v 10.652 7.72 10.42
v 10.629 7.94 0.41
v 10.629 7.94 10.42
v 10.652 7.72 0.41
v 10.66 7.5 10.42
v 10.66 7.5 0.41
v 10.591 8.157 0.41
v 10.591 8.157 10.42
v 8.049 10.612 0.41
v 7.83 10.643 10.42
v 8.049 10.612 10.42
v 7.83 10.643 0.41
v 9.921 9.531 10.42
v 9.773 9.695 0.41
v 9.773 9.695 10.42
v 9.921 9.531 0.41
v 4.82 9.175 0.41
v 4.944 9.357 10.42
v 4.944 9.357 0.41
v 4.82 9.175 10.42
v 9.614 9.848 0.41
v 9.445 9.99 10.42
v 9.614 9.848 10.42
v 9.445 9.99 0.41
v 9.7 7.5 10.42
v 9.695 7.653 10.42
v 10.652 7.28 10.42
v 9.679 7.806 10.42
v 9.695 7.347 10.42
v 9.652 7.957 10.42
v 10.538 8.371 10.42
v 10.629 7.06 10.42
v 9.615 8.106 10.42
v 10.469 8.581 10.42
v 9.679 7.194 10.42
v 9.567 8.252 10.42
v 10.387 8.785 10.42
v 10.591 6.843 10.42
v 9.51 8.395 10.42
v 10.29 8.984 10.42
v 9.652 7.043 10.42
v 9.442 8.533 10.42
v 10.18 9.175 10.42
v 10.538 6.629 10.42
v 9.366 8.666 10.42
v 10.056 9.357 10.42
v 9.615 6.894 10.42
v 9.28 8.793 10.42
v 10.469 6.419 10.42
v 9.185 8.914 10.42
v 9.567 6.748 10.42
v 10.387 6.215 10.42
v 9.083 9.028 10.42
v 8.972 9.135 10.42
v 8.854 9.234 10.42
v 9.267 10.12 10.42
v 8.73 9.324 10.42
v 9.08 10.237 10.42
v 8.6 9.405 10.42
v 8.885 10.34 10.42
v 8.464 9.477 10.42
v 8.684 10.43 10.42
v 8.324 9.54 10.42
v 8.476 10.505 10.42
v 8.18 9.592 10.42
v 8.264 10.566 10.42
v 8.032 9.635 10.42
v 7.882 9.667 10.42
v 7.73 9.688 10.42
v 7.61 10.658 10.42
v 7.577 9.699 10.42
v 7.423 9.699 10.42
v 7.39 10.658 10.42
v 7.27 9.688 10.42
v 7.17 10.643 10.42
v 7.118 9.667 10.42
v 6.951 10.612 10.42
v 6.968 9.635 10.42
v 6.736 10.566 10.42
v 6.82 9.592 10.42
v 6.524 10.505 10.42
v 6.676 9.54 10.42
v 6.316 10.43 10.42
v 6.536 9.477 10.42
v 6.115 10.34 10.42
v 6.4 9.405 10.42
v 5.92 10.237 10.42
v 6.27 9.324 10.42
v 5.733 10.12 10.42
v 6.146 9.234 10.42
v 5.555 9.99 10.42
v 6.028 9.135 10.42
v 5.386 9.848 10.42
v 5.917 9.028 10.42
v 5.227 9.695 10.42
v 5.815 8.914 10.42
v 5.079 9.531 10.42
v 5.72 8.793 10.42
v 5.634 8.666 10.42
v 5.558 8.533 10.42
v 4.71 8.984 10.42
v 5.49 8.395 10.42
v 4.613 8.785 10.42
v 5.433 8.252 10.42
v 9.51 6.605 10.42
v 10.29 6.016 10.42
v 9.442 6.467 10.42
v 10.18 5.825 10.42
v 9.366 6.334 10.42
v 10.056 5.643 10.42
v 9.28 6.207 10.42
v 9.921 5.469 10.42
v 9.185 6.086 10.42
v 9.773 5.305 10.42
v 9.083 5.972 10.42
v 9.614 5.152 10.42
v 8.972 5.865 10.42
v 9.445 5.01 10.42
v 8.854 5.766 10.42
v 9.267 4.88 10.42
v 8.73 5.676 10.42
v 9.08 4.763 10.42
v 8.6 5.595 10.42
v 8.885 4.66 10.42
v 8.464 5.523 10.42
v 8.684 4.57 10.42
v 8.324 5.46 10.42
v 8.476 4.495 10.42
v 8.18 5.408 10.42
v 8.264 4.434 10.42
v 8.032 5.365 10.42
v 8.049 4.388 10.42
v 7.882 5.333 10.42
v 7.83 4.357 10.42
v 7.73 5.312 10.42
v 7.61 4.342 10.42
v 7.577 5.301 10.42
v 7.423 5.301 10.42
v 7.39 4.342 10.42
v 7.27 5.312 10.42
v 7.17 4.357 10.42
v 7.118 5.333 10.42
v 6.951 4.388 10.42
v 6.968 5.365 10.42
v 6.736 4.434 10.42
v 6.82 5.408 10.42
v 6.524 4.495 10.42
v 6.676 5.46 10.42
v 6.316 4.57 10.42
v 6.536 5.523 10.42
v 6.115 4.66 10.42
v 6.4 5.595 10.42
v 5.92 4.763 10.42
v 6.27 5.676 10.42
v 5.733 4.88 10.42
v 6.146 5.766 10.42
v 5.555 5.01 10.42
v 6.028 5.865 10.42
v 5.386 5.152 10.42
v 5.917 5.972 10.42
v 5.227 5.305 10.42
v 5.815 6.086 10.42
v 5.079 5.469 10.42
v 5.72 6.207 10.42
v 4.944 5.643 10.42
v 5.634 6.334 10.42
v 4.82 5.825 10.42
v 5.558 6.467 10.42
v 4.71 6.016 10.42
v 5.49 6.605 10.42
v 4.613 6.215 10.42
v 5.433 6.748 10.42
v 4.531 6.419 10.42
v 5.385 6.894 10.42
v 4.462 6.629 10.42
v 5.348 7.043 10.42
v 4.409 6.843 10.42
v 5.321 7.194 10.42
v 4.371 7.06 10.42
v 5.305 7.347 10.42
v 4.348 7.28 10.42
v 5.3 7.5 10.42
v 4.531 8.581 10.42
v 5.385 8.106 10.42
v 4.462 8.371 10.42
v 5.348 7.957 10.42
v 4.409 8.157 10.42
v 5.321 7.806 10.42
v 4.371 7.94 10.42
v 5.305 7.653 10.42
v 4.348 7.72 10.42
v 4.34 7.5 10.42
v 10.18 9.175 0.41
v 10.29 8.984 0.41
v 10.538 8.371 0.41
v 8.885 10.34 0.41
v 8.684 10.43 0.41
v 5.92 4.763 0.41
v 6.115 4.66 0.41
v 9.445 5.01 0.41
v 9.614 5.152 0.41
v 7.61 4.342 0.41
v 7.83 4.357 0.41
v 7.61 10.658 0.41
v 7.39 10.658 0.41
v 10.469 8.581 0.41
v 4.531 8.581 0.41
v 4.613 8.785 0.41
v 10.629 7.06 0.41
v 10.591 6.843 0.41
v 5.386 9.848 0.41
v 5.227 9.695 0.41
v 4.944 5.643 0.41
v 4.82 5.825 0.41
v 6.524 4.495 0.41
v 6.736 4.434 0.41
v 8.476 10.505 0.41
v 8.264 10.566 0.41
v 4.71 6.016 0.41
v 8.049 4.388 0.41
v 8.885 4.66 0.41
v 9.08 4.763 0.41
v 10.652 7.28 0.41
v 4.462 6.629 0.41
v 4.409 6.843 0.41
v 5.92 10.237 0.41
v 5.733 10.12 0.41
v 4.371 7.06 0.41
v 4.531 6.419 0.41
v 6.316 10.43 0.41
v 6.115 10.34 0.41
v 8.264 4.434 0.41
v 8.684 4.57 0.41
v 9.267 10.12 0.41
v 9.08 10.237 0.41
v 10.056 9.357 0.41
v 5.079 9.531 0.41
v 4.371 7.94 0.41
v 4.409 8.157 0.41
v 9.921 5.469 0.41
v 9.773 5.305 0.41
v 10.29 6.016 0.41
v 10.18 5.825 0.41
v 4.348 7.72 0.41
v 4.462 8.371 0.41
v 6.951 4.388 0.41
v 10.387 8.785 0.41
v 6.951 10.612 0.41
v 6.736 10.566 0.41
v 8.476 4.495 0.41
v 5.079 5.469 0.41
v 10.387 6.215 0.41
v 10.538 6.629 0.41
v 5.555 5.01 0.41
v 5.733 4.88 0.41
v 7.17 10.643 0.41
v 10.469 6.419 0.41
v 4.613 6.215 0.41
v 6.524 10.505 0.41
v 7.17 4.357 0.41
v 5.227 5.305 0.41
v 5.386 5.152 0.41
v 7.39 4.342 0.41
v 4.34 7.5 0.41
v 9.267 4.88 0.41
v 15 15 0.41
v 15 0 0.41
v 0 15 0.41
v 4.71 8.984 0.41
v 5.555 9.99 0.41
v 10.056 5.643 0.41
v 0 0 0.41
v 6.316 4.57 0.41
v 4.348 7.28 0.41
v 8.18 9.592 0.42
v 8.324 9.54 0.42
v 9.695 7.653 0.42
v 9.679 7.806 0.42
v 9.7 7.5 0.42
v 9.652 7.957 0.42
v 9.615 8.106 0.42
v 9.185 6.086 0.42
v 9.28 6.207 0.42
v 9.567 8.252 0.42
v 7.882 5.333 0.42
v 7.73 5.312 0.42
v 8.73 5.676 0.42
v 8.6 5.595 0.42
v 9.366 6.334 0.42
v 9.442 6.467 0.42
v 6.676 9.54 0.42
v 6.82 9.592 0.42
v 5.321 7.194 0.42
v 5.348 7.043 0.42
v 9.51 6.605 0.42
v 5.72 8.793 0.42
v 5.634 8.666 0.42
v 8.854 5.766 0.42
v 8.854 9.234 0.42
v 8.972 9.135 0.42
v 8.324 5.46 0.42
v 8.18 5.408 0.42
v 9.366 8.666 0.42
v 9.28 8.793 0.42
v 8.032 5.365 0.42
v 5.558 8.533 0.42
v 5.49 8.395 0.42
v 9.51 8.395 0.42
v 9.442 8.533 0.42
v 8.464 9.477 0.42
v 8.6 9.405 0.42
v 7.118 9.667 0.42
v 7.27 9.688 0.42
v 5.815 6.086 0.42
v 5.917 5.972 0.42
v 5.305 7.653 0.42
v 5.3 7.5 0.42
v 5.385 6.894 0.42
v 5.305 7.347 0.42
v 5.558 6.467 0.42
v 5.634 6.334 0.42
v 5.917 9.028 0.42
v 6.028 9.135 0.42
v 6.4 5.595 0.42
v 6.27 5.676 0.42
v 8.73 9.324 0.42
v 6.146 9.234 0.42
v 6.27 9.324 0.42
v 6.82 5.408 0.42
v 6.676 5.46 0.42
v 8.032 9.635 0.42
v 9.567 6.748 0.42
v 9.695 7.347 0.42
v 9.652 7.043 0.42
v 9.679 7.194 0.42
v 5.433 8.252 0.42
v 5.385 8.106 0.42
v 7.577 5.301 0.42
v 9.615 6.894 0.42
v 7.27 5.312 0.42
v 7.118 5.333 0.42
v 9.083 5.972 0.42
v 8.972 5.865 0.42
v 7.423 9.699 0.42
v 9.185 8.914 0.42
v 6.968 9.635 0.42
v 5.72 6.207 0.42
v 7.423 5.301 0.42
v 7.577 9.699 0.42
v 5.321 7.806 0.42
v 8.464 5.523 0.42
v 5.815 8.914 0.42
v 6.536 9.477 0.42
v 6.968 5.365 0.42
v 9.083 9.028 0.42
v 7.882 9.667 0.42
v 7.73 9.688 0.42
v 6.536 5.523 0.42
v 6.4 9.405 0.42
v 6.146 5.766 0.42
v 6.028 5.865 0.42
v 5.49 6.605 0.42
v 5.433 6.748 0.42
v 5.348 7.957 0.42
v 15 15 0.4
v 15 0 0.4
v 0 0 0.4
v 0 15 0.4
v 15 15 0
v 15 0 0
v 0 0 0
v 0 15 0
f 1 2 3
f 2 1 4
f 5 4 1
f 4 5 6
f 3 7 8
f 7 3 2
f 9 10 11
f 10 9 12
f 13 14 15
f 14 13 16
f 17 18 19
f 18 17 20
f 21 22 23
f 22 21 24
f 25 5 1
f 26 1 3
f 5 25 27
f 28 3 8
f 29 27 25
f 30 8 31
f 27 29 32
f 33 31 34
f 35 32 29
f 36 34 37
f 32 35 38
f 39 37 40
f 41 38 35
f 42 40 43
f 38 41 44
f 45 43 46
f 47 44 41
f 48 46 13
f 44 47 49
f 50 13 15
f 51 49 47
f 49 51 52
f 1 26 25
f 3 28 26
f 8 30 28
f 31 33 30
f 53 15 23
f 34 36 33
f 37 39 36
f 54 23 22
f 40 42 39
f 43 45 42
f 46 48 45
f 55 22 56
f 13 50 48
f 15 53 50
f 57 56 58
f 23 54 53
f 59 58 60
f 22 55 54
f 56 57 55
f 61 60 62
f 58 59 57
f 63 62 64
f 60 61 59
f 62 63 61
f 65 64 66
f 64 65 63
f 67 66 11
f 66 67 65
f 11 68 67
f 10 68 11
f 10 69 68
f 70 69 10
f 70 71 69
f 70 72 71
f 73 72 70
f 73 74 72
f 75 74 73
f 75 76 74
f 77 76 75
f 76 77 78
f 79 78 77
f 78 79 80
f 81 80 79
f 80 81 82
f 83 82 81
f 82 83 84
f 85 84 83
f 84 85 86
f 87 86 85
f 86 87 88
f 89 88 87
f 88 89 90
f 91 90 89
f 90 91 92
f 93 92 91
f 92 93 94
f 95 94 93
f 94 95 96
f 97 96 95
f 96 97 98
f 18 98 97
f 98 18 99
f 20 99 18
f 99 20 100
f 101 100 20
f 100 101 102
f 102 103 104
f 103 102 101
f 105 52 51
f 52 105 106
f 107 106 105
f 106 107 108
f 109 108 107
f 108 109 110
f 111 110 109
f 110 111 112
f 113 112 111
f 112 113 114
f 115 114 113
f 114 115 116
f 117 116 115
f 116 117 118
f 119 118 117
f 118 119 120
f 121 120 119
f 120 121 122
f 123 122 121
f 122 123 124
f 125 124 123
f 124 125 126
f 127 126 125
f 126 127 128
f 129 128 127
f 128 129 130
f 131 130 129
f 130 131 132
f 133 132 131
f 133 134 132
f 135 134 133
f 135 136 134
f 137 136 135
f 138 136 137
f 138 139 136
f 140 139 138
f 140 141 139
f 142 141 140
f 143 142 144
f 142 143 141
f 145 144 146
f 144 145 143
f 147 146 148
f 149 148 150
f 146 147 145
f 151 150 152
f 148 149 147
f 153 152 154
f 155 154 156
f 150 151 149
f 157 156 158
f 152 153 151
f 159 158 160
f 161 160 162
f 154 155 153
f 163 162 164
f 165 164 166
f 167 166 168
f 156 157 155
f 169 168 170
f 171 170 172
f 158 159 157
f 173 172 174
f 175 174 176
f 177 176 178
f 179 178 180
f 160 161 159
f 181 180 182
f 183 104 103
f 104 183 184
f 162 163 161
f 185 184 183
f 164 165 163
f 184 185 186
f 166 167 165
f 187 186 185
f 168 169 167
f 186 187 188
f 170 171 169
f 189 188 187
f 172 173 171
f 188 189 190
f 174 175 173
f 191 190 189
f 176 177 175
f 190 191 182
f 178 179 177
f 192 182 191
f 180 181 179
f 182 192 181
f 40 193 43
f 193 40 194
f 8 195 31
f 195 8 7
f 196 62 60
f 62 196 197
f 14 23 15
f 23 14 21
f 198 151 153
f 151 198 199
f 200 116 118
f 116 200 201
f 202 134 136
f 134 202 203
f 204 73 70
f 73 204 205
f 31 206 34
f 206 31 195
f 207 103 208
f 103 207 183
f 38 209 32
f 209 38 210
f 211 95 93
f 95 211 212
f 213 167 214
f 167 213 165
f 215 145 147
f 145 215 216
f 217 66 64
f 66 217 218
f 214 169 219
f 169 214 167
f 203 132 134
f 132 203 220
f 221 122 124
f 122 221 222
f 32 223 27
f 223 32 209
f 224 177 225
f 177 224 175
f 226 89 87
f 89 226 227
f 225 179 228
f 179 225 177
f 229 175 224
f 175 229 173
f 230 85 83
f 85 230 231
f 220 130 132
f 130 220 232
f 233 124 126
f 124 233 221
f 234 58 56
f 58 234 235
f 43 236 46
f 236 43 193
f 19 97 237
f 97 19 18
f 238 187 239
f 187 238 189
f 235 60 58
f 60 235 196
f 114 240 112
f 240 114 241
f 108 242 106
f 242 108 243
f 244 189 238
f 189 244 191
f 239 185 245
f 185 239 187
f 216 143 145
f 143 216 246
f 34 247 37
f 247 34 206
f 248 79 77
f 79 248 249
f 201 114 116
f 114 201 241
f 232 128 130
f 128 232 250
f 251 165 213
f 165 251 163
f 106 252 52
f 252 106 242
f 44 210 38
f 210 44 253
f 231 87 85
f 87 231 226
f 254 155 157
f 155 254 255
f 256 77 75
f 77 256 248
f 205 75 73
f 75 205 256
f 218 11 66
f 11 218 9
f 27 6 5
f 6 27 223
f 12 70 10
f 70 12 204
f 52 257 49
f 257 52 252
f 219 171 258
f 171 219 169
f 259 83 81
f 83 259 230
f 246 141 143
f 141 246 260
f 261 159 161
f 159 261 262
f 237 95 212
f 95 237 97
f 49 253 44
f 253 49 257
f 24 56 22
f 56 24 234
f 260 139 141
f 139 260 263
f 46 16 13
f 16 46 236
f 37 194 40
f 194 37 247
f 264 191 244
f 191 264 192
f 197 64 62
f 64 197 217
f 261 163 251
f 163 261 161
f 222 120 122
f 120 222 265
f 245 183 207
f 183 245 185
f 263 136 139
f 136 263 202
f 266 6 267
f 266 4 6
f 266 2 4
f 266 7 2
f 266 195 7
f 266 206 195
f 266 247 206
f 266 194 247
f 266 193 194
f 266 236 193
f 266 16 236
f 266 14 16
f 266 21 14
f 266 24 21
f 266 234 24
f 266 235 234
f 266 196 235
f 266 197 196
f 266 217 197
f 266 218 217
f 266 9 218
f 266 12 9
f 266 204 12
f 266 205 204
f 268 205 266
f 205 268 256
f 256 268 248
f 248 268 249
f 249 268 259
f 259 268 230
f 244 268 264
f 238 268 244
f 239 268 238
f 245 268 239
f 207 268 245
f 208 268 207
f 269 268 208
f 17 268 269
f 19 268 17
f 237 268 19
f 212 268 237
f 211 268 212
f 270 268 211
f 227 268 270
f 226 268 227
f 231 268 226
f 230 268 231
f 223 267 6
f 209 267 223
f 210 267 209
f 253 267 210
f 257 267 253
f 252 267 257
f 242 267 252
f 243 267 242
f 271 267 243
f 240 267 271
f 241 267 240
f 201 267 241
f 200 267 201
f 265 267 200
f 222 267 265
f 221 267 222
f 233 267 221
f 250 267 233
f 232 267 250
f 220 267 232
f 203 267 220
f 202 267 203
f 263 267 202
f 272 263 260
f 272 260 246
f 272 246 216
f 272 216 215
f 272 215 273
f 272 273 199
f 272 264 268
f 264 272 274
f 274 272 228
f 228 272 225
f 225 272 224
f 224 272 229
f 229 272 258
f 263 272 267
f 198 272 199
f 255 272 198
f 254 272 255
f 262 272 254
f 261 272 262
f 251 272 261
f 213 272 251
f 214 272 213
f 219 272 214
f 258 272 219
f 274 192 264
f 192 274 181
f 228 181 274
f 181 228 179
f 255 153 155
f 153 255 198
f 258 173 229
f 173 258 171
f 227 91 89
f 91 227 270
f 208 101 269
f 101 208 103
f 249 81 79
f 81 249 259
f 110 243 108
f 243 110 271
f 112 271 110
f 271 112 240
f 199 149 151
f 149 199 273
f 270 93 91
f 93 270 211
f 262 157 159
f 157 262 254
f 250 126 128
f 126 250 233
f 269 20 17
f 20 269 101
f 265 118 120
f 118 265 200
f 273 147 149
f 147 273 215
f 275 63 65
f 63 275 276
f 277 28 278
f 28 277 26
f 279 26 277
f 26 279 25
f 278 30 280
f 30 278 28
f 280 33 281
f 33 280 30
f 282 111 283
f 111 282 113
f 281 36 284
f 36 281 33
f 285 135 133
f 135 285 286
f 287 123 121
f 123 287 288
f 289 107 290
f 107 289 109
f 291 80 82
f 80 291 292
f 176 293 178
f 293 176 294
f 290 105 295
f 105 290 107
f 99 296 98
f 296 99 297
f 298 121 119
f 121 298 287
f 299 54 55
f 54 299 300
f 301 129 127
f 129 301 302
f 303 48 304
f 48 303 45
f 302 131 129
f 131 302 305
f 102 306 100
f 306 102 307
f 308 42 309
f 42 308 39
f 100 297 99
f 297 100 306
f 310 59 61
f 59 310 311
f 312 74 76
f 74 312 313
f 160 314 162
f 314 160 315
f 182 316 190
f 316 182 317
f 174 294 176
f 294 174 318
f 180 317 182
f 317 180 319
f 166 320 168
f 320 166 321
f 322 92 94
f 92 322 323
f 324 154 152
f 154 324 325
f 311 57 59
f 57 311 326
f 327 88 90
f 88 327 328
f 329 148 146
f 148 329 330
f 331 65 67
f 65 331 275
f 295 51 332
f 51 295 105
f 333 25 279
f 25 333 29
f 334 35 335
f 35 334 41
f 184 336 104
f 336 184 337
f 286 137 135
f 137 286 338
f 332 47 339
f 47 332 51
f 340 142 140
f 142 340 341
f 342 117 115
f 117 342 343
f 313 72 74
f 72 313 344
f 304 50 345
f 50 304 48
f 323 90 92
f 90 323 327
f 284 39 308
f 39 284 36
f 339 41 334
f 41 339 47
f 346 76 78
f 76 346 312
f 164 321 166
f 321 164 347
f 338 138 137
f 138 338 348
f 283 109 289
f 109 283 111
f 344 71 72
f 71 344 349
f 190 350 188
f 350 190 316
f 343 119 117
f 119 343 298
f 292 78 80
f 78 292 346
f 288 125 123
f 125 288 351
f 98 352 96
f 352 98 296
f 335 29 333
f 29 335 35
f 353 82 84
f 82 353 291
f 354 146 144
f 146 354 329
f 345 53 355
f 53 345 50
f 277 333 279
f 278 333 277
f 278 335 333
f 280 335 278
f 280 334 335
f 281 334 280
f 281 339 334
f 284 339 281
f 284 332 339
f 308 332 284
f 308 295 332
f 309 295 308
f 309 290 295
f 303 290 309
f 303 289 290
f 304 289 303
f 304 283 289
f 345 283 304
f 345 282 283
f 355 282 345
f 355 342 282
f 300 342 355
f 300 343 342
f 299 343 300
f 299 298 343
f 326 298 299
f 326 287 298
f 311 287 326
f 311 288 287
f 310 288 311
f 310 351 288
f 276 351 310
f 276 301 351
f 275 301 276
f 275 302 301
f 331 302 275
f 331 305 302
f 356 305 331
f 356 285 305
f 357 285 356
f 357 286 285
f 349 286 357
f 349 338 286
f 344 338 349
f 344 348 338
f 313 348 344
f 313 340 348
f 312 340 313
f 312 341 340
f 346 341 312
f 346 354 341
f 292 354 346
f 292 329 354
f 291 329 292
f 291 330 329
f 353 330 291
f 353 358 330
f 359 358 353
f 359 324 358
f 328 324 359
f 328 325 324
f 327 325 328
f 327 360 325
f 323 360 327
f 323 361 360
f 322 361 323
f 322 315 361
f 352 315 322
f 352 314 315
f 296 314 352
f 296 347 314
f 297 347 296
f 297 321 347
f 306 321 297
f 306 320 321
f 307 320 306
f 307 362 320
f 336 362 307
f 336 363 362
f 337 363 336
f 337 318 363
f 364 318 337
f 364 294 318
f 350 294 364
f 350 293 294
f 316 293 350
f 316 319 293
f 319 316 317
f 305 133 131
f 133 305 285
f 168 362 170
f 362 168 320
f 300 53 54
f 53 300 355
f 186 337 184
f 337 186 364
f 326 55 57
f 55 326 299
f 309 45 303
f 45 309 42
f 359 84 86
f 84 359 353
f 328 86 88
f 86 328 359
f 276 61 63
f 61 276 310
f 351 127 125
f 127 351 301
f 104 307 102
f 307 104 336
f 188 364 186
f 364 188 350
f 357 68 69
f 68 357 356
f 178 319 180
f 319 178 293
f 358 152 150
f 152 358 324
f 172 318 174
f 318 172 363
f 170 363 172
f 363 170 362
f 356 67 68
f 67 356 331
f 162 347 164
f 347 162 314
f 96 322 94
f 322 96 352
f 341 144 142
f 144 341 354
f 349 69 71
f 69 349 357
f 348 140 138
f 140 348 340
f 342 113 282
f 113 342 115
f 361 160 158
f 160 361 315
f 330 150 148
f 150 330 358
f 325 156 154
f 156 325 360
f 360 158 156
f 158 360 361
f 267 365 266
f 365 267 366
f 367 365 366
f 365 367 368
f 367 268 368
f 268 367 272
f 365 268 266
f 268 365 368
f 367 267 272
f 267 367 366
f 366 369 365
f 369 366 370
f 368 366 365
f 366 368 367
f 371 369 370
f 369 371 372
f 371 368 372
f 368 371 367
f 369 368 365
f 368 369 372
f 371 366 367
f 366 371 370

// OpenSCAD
// file: ../../Base/PlacementOptions.scad
// Fischertechnik Box Foundation
// Placement Options

// Alignment
NoAlign = 0;
AlignLeft = 1;
AlignBottom = 2;
AlignCenter = 3;
AlignRight = 4;
AlignTop = 5;

// Element rotation degree steps
rotations = [0, -90, -180, -270];

// Rotation
NoRotation = 0;
Rotate0 = 0;
Rotate90 = 1;
Rotate180 = 2;
Rotate270 = 3;

// Docking (seen from above)
NoDock = -1;
DockLeft = 0;
DockTop = 1;
DockRight = 2;
DockCorner = 2;
DockBottom = 3;

// Web corners
LowerLeft = 0;
UpperLeft = 1;
UpperRight = 2;
LowerRight = 3;

// Web position relative to corner
LeftOfCorner = 0;
RightOfCorner = 1;

// Rails direction
Horizontal = true;
Vertical = false;
// file: ../../Base/Boxes.scad
// Fischertechnik Box Foundation
// Pre-designed Boxes

use <Constants.scad>

include <PlacementOptions.scad>

box190Width = 190;
box190Depth = 130;
box130Width = 130;
box130Depth = 95;

// Values are from an original ec3 box
topBottomDifference = 1.5;
outerHeight = 40;
baseThickness = 1.8;
innerHeight = outerHeight - baseThickness;
stackExcess = 5.7;
radius = 3.5;
wallThickness = 1.5;
tolerance = 0.2;

boxWallThickness = wallThickness;
boxBaseThickness = baseThickness;
boxWebWidth = 3.0;

// getBoxWallThickness()
// Gets the wall thickness of a Fischertechnik Box
function getBoxWallThickness() = boxWallThickness;

// getBoxUsageHeight(height = 38.2)
// Gets the usable height of a Fischertechnik box
// height = Outer height of the box from the bottom to the upper edge.
function getBoxUsageHeight(height = outerHeight) = height - baseThickness - stackExcess;

// getBoxInnerHeight()
// Gets the inner height of a Fischertechnik box, including the stack excess
function getBoxInnerHeight() = innerHeight;

// getBoxBaseThickness()
// Gets the thickness of the Fischertechnik box base.
function getBoxBaseThickness() = boxBaseThickness;

// getBoxWebWidth()
// Gets the width of a box web
function getBoxWebWidth() = boxWebWidth;

// getBox190Space()
// Gets the usable inner space of a Box 190 as an x/y-list
function getBox190Space() = [
    box190Width - 2*getBoxWallThickness() - topBottomDifference, 
    box190Depth - 2*getBoxWallThickness() - topBottomDifference ];

// RoundedCornerPlate(width, depth, height, radius)
// Creates a body plate with rounded corners for a box. Used
// also to create the complete box with the hull module.
// width = Width of the plate
// depth = depth of the plate 
// height = thickness of the plate
// radius = radius of the rounded corner
module RoundedCornerPlate(width, depth, height, radius) {
    translate([radius, radius])
    hull() {
        w = width-2*radius;
        d = depth-2*radius;
        cube([w, d, height]);
        cylinder(height, r=radius, $fn=getFragments());
        translate([w, 0])
            cylinder(height, r=radius, $fn=getFragments());
        translate([w, d])
            cylinder(height, r=radius, $fn=getFragments());
        translate([0, d])
            cylinder(height, r=radius, $fn=getFragments());
    }
}

// BoxBase(width, depth)
// Creates an empty stackable Fischertechnik compatible box
// width = Outer width of the box (190, 130, ...)
// depth = Outer depth of the box (130, 95, ...)

module BoxBase(width, depth, height=outerHeight) {    
    thinPlate = 0.01;

    innerHeight = height - baseThickness;    
    
    module Body(tolerance=tolerance) {
        hull() {
            // Bottom with tolerance to fit into the original boxes when stacked
            translate([-wallThickness+tolerance, -wallThickness+tolerance, -baseThickness])
                RoundedCornerPlate(width-topBottomDifference-2*tolerance, depth-topBottomDifference-2*tolerance, thinPlate, radius);
            
            // Top
            translate([-wallThickness-topBottomDifference/2, -wallThickness-topBottomDifference/2, innerHeight-thinPlate])
                RoundedCornerPlate(width, depth, thinPlate, radius);
         }
    }

    module Cutoff() {
        hull() {
            coWidth = width - 2*wallThickness;
            coDepth = depth - 2*wallThickness;
            
            // Bottom
            RoundedCornerPlate(coWidth-topBottomDifference, coDepth-topBottomDifference, thinPlate, radius);

            // Top
            translate([-topBottomDifference/2, -topBottomDifference/2, innerHeight+thinPlate]) 
                RoundedCornerPlate(coWidth, coDepth, thinPlate, radius);
        }
    }
    
    difference() {        
        Body();
        Cutoff();
        stackOffset = innerHeight - stackExcess;
        translate([0, 0, stackOffset + baseThickness])
            Body(tolerance=0);
    }
}

// Creates the Fischertechnik empty box 130x190 mm and places it at position 0,0
// 190x130 are the outer sizes, the inner space is slightly smaller. Use getBox190Space() to get the inner sizes.
// The box is positioned that the usable inner space is at the 0,0,0 position.

module Box190() {
    BoxBase(box190Width, box190Depth);
}

// Gets the usable inner space of a Box 130 as an x/y-list
function getBox130Space() = [
    box130Width - 2*getBoxWallThickness() - topBottomDifference, 
    box130Depth - 2*getBoxWallThickness() - topBottomDifference ];

// Creates the Fischertechnik empty box 95x130 mm and places it at position 0,0
// 190x130 are the outer sizes, the inner space is slightly smaller. Use getBox190Space() to get the inner sizes.
// The box is positioned that the usable inner space is at the 0,0,0 position.

module Box130() {
    BoxBase(box130Width, box130Depth);
}

// Creates a web at the specified box walls
// corner 0 = LowerLeft, 1 = UpperLeft, 2 = UpperRight, 3 = LowerRight
// side 0 = LeftOfCorner, 1 = RightOfCorner
// distance = Distance in mm from the corner
// boxSpace = inner width and depth of the box (default: Box 190)
// webWidth = length of the web (default is 3 mms)
// webThickness = thickness of the web (default is 1 mm)
// height = Height of the web (standard is getBoxUsageHeight())
// sink = How much of the web is sunk into the wall

module BoxWeb(
    corner, 
    side, 
    distance, 
    boxSpace=getBox190Space(), 
    webWidth=getBoxWebWidth(), 
    webThickness=1.0, 
    height=getBoxUsageHeight(),
    sink = getBoxWallThickness()/2) {
    width = (corner % 2 == 0) ? 
            (side == LeftOfCorner ? webWidth : webThickness) :
            (side == LeftOfCorner ? webThickness : webWidth);

    depth = (corner % 2 == 0) ? 
            (side == RightOfCorner ? webWidth : webThickness) :
            (side == RightOfCorner ? webThickness : webWidth);
    
    xDiff = corner == LowerLeft ? 
                (side == LeftOfCorner ? -sink : distance) :
            (corner == UpperLeft ?                
                (side == LeftOfCorner ? distance : -sink) :
            (corner == UpperRight ?
                (side == LeftOfCorner ? boxSpace.x-webWidth+sink : boxSpace.x-distance-webThickness) :
                (side == LeftOfCorner ? boxSpace.x-distance-webThickness: boxSpace.x-webWidth+sink)));

    yDiff = corner == LowerLeft ? 
                (side == RightOfCorner ? -sink : distance) :
            (corner == UpperLeft ?
                (side == RightOfCorner ? boxSpace.y-distance-webThickness : boxSpace.y-webWidth+sink) :
            (corner == UpperRight ?
                (side == RightOfCorner ? boxSpace.y-webWidth+sink : boxSpace.y-distance-webThickness) :
                (side == RightOfCorner ? distance : -sink)));
    
    translate([xDiff, yDiff, -getExcess()])
        cube([width, depth, height + 2*getExcess()]);
}
// file: ../../Base/Rotation.scad
// Fischertechnik Box Foundation
// Geometry Helpers Rotation

include <PlacementOptions.scad>

// getRotatedSpace(space, rotation=NoRotation)
// Rotates the space dependent on the specified rotation

function getRotatedSpace(space, rotation=NoRotation) = [
    (rotation == Rotate90 || rotation == Rotate270) ? space.y : space.x,
    (rotation == Rotate90 || rotation == Rotate270) ? space.x : space.y
];

// Rotates the given space around the fixed left lower corner
// space = the space the children needs as width/depth list [width,depth]
// rotation = 0 Rotate0 degrees, 1 Rotate90 degrees, 2 Rotate180 degrees, 3 Rotate270 degrees (equivalent to -90)

module RotateFix(space, rotation=NoRotation) {
    dy = (rotation == Rotate0 || rotation == Rotate270) ? 0 :
        (rotation == Rotate90) ? space.x :
        space.y;
    dx = (rotation < Rotate180) ? 0 :
        (rotation == Rotate180) ? space.x :
        space.y;
    
    translate([dx, dy, 0])
        rotate([0, 0, rotations[rotation]])
            children();
}
// file: ../../Base/Alignment.scad
// Fischertechnik Box Foundation
// Geometry Helpers Alignment

include <PlacementOptions.scad>

// getAlignedX(elementWidth, spaceWidth, align=AlignRight, offset=0)
// Gets the aligned X offset of an element with the given
// width in the given space.
// elementWidth = The width of the element to positon
// spaceWidth = The space where the element should be aligned
// align = 0 AlignLeft, 1 AlignCenter, 2 AlignRight
// offset = an optional offset from the aligned position. When
// aligned left or centered, then positive values are in X direction.
// When aligned right then positive values are in negative X direction.

function getAlignedX(elementWidth, spaceWidth, align=AlignRight, offset=0) =
    (align == AlignLeft) ?
        offset :
        ((align == AlignCenter) ?
        (spaceWidth - elementWidth)/2 + offset :
        spaceWidth - offset - elementWidth);

// getAlignedY(elementDepth, spaceDepth, align=AlignTop, offset=0)
// Gets the aligned Y offset of an element with the given
// depth in the given space.
// elementDepth = The depth of the element to positon
// spaceDepth = The space where the element should be aligned
// align = 0 AlignBottom, 1 AlignCenter, 2 AlignTop
// offset = an optional offset from the aligned position. When
// aligned bottom or centered, then positive values are in Y direction.
// When aligned top then positive values are in negative Y direction.

function getAlignedY(elementDepth, spaceDepth, align=AlignTop, offset=0) =
    (align == AlignBottom) ?
        offset :
        ((align == AlignCenter) ?
        (spaceDepth - elementDepth)/2 + offset :
        spaceDepth - offset - elementDepth);
// file: ../../Base/Placement.scad
// Fischertechnik Box Foundation
// Geometry Helpers Placement

use <Constants.scad>
use <Alignment.scad>
use <Rotation.scad>
use <Boxes.scad>

include <PlacementOptions.scad>

// Place(x=0, y=0, elementSpace=[0,0], alignX=AlignLeft, alignY=AlignBottom, rotation=Rotate0, boxSpace=getBox190Space())
// Places the child at the specified position
// y = Y-Position. This is a relative position when an X aligment is specified.
// x = X-Position. This is a relative position when an Y aligment is specified.
// elementSpace = space of the element to be placed [x,y]
// alignX = -1=NoAlign, 0 AlignLeft, 1 AlignCenter, 3 AlignRight (elementSpace and boxSpace required!)
// alignY = -1=NoAlign, 2 AlignBottom, 1 AlignCenter, 4 AlignTop (elementSpace and boxSpace required!)
// rotation = 0 Rotate0 0 degrees, 1 Rotate90 90 degrees, 
// 2 Rotate180 180 degrees, 3 Rotate270 270 degrees (equivalent to -90)
// boxSpace = Inner space of the box where the placement occurs [x,y] - default is Box 190x130 inner space

module Place(x=0, y=0, elementSpace=[0,0], 
  alignX=AlignLeft, alignY=AlignBottom, 
  rotation=NoRotation, boxSpace=getBox190Space()) {

    module Position(x, y, space, rotation=Rotate0) {
        translate([x, y, 0])
            RotateFix(space, rotation)
                children();
    }

    space = getRotatedSpace(elementSpace, rotation);
    alignedX = getAlignedX(space.x, boxSpace.x, alignX, x);
    alignedY = getAlignedY(space.y, boxSpace.y, alignY, y);
    Position(alignedX, alignedY, elementSpace, rotation)
        children();
}

// Center(space=getBox130Space(), elementSpace=[0,0])
// space = Space where the children is centered. For cylinder use centered=true and no elementSpace.
// elementSpace = space of the element to be centered [x,y]

module Center(space=getBox190Space(), elementSpace=[0,0]) {
    Place(elementSpace=elementSpace, boxSpace=space, alignX=AlignCenter, alignY=AlignCenter)
        children();
}

// CenterHorizontal(width=0, y=0, offset=0, space=getBox130Space())
// width = Width of the element to be placed.
// y = Y position of the element
// offset = Offset from the center position (negative will be left of the center)
// space = Space where the element is placed

module CenterHorizontal(width=0, y=0, offset=0, space=getBox190Space()) {
    Place(x=offset, y=y, elementSpace=[width, 0], boxSpace=space, alignX=AlignCenter)
        children(0);
}

// CenterVertical(depth=0, x=0, offset=0, space=getBox130Space())
// depth = Depth of the element to be placed.
// x = X position of the element
// offset = Offset from the center position (negative will be down of the center)
// space = Space where the element is placed

module CenterVertical(depth=0, x=0, offset=0, space=getBox190Space()) {
    Place(x=x, y=offset, elementSpace=[0, depth], boxSpace=space, alignY=AlignCenter)
        children(0);
}

// getIsVertical(align)
// True if the specified alignment needs a vertical orientation for a divider (AlignRight, AlignLeft)

function getIsVertical(align) = (align == AlignRight || align == AlignLeft);

// getIsHorizontal(align)
// True if the specified alignment needs a horizontal orientation for a divider (AlignTop, AlignBottom)

function getIsHorizontal(align) = (align == AlignTop || align == AlignBottom);
// file: ../../Elements/AxisClip10.scad
// Fischertechnik Box Library
// Axis for clip 10
// 31023

use <../ModelBase/Simple.scad>
use <../Base/Constants.scad>

/* [Element Parameters] */
height = 23;
clipHeight = 10;

/* [Hidden] */
width = 12;
depth = 12;
upperDiameter = 3.6;

// getAxisClip10Space()
// Gets the space of a n axis for a clip 10 with spring ring (mot2)

function getAxisClip10Space() = [width, depth, height];

// AxisClip10(height, clipHeight)
// Axis for clip 10 with spring ring (mot2)
// height = Height of the complete axis (standard is 23, in mot3 its only 12)
// clipHeight = Height of the part for the clip (standard is 10, in mot3 its only 7)

module AxisClip10(height=height, clipHeight=clipHeight) {
    LeveledAxisWithSpace(height, height-clipHeight, getAxisClip10Space(), diameter=upperDiameter);
}

// Test
color("lightgray")
AxisClip10(height, clipHeight);
// file: ../../Base/Constants.scad
// Fischertechnik Box Foundation
// Constants

// Constant values necessary for multiple elements

// Base constants
dividerThickness = 1.2;
excess = 0.01;
fragments = 90;
tolerance = 0.8;

// Gets the thickness of a divider 
function getDividerThickness() = dividerThickness;

// Gets the excess that is used to merge walls into each other
function getExcess() = excess;

// Gets amount of fragments of a cylinder
function getFragments() = fragments;

// Gets the inner tolerance of a frame to each side
function getTolerance() = tolerance;


// Fischertechnik specific constants
axisDiameter = 4;
axisBottomDiameter = axisDiameter + 1;
axisTolerance = 0.2;
axisLockingLength = 8;

// Gets axis diameter of Fischertechnik axis
function getAxisDiameter() = axisDiameter;

// Gets axis diameter tolerance (subtracted for element axis)
function getAxisTolerance() = axisTolerance;

// Gets the axis diameter for standing axis
function getStandAxisDiameter() = getAxisDiameter() - getAxisTolerance();

// Gets axis bottom diameter for thicker part at the bottom
function getAxisBottomDiameter() = axisBottomDiameter;

// Gets the lengthh of the locking part of a locking axis
function getAxisLockingLength() = axisLockingLength;

pinHeight = 2.5;
pinTolerance = 0.2;

// gets the height of a connecting pin
function getPinHeight() = pinHeight;

// gets the connecting pin height tolerance
function getPinTolerance() = pinTolerance;

standardEdgeDistance = 2.5;
standardWebDistance = 11.5;
standardCornerLength = 15;

// gets the standard distance to the wall of the box for dockable frames with webs
function getStandardEdgeDistance() = standardEdgeDistance;

// gets the standard distance of each web to the corner of the dockable frame
function getStandardWebDistance() = standardWebDistance;

// gets the standard length of the corner walls of a dockable frame
function getStandardCornerLength() = standardCornerLength;

tubeWallFactor = 0.8;

// gets the wall thickness of a tube.
function getTubeWallThickness() = tubeWallFactor * getDividerThickness();

smallPartsFrameHeight = 20;

// gets the frame height for docked small parts boxes.
function getSmallPartsFrameHeight() = smallPartsFrameHeight;

hubRingDiameter = 19.5;
hubRingLevelDiameter = 21;

// gets the diameter of a tube matching the inner ring of a wheel
function getHubRingDiameter() = hubRingDiameter;

// gets the diameter of a hub tube with a thicker diameter
function getHubRingLevelDiameter() = hubRingLevelDiameter;
// file: ../../Elements/CylinderLockingGearZ28.scad
// Fischertechnik Box Library
// Cylinder for standing locking axis with gear Z28
// 31082

use <../Base/Constants.scad>
use <../Base/Placement.scad>
use <../ModelBase/Simple.scad>
use <../ModelBase/Complex.scad>

/* [Hidden] */
width = 15;
depth = 15;
height = 10;

// getCylinderLockingGearZ28Space()
// Gets the space the cylinder for a 30 mm axis needs

function getCylinderLockingGearZ28Space() = [width, depth, height];

// CylinderLockingGearZ28()
// Standing cylinder for locking axis with gear Z28
// 31034

module CylinderLockingGearZ28() {
    Space(getCylinderLockingGearZ28Space());
    
    Center(getCylinderLockingGearZ28Space())
        Tube(height, innerDiameter=getFrameAxisDepth());
}

// Tests
color("lightgray")
CylinderLockingGearZ28();
// file: ../TestPrint.scad
// 3D Print Test Base

use <../Base/Constants.scad>

use <../Elements/AxisClip10.scad>

module TestPrint(elementSpace) {
    cube([elementSpace.x, elementSpace.y, 0.4]);
    translate([0,0,0.4+getExcess()]) {
        children();
    }
}

TestPrint(getAxisClip10Space())
    AxisClip10();
// main file
// 3D Print Test
// CylinderLockingGearZ28

use <../TestPrint.scad>
use <../../Elements/CylinderLockingGearZ28.scad>

TestPrint(getCylinderLockingGearZ28Space())
    CylinderLockingGearZ28();
